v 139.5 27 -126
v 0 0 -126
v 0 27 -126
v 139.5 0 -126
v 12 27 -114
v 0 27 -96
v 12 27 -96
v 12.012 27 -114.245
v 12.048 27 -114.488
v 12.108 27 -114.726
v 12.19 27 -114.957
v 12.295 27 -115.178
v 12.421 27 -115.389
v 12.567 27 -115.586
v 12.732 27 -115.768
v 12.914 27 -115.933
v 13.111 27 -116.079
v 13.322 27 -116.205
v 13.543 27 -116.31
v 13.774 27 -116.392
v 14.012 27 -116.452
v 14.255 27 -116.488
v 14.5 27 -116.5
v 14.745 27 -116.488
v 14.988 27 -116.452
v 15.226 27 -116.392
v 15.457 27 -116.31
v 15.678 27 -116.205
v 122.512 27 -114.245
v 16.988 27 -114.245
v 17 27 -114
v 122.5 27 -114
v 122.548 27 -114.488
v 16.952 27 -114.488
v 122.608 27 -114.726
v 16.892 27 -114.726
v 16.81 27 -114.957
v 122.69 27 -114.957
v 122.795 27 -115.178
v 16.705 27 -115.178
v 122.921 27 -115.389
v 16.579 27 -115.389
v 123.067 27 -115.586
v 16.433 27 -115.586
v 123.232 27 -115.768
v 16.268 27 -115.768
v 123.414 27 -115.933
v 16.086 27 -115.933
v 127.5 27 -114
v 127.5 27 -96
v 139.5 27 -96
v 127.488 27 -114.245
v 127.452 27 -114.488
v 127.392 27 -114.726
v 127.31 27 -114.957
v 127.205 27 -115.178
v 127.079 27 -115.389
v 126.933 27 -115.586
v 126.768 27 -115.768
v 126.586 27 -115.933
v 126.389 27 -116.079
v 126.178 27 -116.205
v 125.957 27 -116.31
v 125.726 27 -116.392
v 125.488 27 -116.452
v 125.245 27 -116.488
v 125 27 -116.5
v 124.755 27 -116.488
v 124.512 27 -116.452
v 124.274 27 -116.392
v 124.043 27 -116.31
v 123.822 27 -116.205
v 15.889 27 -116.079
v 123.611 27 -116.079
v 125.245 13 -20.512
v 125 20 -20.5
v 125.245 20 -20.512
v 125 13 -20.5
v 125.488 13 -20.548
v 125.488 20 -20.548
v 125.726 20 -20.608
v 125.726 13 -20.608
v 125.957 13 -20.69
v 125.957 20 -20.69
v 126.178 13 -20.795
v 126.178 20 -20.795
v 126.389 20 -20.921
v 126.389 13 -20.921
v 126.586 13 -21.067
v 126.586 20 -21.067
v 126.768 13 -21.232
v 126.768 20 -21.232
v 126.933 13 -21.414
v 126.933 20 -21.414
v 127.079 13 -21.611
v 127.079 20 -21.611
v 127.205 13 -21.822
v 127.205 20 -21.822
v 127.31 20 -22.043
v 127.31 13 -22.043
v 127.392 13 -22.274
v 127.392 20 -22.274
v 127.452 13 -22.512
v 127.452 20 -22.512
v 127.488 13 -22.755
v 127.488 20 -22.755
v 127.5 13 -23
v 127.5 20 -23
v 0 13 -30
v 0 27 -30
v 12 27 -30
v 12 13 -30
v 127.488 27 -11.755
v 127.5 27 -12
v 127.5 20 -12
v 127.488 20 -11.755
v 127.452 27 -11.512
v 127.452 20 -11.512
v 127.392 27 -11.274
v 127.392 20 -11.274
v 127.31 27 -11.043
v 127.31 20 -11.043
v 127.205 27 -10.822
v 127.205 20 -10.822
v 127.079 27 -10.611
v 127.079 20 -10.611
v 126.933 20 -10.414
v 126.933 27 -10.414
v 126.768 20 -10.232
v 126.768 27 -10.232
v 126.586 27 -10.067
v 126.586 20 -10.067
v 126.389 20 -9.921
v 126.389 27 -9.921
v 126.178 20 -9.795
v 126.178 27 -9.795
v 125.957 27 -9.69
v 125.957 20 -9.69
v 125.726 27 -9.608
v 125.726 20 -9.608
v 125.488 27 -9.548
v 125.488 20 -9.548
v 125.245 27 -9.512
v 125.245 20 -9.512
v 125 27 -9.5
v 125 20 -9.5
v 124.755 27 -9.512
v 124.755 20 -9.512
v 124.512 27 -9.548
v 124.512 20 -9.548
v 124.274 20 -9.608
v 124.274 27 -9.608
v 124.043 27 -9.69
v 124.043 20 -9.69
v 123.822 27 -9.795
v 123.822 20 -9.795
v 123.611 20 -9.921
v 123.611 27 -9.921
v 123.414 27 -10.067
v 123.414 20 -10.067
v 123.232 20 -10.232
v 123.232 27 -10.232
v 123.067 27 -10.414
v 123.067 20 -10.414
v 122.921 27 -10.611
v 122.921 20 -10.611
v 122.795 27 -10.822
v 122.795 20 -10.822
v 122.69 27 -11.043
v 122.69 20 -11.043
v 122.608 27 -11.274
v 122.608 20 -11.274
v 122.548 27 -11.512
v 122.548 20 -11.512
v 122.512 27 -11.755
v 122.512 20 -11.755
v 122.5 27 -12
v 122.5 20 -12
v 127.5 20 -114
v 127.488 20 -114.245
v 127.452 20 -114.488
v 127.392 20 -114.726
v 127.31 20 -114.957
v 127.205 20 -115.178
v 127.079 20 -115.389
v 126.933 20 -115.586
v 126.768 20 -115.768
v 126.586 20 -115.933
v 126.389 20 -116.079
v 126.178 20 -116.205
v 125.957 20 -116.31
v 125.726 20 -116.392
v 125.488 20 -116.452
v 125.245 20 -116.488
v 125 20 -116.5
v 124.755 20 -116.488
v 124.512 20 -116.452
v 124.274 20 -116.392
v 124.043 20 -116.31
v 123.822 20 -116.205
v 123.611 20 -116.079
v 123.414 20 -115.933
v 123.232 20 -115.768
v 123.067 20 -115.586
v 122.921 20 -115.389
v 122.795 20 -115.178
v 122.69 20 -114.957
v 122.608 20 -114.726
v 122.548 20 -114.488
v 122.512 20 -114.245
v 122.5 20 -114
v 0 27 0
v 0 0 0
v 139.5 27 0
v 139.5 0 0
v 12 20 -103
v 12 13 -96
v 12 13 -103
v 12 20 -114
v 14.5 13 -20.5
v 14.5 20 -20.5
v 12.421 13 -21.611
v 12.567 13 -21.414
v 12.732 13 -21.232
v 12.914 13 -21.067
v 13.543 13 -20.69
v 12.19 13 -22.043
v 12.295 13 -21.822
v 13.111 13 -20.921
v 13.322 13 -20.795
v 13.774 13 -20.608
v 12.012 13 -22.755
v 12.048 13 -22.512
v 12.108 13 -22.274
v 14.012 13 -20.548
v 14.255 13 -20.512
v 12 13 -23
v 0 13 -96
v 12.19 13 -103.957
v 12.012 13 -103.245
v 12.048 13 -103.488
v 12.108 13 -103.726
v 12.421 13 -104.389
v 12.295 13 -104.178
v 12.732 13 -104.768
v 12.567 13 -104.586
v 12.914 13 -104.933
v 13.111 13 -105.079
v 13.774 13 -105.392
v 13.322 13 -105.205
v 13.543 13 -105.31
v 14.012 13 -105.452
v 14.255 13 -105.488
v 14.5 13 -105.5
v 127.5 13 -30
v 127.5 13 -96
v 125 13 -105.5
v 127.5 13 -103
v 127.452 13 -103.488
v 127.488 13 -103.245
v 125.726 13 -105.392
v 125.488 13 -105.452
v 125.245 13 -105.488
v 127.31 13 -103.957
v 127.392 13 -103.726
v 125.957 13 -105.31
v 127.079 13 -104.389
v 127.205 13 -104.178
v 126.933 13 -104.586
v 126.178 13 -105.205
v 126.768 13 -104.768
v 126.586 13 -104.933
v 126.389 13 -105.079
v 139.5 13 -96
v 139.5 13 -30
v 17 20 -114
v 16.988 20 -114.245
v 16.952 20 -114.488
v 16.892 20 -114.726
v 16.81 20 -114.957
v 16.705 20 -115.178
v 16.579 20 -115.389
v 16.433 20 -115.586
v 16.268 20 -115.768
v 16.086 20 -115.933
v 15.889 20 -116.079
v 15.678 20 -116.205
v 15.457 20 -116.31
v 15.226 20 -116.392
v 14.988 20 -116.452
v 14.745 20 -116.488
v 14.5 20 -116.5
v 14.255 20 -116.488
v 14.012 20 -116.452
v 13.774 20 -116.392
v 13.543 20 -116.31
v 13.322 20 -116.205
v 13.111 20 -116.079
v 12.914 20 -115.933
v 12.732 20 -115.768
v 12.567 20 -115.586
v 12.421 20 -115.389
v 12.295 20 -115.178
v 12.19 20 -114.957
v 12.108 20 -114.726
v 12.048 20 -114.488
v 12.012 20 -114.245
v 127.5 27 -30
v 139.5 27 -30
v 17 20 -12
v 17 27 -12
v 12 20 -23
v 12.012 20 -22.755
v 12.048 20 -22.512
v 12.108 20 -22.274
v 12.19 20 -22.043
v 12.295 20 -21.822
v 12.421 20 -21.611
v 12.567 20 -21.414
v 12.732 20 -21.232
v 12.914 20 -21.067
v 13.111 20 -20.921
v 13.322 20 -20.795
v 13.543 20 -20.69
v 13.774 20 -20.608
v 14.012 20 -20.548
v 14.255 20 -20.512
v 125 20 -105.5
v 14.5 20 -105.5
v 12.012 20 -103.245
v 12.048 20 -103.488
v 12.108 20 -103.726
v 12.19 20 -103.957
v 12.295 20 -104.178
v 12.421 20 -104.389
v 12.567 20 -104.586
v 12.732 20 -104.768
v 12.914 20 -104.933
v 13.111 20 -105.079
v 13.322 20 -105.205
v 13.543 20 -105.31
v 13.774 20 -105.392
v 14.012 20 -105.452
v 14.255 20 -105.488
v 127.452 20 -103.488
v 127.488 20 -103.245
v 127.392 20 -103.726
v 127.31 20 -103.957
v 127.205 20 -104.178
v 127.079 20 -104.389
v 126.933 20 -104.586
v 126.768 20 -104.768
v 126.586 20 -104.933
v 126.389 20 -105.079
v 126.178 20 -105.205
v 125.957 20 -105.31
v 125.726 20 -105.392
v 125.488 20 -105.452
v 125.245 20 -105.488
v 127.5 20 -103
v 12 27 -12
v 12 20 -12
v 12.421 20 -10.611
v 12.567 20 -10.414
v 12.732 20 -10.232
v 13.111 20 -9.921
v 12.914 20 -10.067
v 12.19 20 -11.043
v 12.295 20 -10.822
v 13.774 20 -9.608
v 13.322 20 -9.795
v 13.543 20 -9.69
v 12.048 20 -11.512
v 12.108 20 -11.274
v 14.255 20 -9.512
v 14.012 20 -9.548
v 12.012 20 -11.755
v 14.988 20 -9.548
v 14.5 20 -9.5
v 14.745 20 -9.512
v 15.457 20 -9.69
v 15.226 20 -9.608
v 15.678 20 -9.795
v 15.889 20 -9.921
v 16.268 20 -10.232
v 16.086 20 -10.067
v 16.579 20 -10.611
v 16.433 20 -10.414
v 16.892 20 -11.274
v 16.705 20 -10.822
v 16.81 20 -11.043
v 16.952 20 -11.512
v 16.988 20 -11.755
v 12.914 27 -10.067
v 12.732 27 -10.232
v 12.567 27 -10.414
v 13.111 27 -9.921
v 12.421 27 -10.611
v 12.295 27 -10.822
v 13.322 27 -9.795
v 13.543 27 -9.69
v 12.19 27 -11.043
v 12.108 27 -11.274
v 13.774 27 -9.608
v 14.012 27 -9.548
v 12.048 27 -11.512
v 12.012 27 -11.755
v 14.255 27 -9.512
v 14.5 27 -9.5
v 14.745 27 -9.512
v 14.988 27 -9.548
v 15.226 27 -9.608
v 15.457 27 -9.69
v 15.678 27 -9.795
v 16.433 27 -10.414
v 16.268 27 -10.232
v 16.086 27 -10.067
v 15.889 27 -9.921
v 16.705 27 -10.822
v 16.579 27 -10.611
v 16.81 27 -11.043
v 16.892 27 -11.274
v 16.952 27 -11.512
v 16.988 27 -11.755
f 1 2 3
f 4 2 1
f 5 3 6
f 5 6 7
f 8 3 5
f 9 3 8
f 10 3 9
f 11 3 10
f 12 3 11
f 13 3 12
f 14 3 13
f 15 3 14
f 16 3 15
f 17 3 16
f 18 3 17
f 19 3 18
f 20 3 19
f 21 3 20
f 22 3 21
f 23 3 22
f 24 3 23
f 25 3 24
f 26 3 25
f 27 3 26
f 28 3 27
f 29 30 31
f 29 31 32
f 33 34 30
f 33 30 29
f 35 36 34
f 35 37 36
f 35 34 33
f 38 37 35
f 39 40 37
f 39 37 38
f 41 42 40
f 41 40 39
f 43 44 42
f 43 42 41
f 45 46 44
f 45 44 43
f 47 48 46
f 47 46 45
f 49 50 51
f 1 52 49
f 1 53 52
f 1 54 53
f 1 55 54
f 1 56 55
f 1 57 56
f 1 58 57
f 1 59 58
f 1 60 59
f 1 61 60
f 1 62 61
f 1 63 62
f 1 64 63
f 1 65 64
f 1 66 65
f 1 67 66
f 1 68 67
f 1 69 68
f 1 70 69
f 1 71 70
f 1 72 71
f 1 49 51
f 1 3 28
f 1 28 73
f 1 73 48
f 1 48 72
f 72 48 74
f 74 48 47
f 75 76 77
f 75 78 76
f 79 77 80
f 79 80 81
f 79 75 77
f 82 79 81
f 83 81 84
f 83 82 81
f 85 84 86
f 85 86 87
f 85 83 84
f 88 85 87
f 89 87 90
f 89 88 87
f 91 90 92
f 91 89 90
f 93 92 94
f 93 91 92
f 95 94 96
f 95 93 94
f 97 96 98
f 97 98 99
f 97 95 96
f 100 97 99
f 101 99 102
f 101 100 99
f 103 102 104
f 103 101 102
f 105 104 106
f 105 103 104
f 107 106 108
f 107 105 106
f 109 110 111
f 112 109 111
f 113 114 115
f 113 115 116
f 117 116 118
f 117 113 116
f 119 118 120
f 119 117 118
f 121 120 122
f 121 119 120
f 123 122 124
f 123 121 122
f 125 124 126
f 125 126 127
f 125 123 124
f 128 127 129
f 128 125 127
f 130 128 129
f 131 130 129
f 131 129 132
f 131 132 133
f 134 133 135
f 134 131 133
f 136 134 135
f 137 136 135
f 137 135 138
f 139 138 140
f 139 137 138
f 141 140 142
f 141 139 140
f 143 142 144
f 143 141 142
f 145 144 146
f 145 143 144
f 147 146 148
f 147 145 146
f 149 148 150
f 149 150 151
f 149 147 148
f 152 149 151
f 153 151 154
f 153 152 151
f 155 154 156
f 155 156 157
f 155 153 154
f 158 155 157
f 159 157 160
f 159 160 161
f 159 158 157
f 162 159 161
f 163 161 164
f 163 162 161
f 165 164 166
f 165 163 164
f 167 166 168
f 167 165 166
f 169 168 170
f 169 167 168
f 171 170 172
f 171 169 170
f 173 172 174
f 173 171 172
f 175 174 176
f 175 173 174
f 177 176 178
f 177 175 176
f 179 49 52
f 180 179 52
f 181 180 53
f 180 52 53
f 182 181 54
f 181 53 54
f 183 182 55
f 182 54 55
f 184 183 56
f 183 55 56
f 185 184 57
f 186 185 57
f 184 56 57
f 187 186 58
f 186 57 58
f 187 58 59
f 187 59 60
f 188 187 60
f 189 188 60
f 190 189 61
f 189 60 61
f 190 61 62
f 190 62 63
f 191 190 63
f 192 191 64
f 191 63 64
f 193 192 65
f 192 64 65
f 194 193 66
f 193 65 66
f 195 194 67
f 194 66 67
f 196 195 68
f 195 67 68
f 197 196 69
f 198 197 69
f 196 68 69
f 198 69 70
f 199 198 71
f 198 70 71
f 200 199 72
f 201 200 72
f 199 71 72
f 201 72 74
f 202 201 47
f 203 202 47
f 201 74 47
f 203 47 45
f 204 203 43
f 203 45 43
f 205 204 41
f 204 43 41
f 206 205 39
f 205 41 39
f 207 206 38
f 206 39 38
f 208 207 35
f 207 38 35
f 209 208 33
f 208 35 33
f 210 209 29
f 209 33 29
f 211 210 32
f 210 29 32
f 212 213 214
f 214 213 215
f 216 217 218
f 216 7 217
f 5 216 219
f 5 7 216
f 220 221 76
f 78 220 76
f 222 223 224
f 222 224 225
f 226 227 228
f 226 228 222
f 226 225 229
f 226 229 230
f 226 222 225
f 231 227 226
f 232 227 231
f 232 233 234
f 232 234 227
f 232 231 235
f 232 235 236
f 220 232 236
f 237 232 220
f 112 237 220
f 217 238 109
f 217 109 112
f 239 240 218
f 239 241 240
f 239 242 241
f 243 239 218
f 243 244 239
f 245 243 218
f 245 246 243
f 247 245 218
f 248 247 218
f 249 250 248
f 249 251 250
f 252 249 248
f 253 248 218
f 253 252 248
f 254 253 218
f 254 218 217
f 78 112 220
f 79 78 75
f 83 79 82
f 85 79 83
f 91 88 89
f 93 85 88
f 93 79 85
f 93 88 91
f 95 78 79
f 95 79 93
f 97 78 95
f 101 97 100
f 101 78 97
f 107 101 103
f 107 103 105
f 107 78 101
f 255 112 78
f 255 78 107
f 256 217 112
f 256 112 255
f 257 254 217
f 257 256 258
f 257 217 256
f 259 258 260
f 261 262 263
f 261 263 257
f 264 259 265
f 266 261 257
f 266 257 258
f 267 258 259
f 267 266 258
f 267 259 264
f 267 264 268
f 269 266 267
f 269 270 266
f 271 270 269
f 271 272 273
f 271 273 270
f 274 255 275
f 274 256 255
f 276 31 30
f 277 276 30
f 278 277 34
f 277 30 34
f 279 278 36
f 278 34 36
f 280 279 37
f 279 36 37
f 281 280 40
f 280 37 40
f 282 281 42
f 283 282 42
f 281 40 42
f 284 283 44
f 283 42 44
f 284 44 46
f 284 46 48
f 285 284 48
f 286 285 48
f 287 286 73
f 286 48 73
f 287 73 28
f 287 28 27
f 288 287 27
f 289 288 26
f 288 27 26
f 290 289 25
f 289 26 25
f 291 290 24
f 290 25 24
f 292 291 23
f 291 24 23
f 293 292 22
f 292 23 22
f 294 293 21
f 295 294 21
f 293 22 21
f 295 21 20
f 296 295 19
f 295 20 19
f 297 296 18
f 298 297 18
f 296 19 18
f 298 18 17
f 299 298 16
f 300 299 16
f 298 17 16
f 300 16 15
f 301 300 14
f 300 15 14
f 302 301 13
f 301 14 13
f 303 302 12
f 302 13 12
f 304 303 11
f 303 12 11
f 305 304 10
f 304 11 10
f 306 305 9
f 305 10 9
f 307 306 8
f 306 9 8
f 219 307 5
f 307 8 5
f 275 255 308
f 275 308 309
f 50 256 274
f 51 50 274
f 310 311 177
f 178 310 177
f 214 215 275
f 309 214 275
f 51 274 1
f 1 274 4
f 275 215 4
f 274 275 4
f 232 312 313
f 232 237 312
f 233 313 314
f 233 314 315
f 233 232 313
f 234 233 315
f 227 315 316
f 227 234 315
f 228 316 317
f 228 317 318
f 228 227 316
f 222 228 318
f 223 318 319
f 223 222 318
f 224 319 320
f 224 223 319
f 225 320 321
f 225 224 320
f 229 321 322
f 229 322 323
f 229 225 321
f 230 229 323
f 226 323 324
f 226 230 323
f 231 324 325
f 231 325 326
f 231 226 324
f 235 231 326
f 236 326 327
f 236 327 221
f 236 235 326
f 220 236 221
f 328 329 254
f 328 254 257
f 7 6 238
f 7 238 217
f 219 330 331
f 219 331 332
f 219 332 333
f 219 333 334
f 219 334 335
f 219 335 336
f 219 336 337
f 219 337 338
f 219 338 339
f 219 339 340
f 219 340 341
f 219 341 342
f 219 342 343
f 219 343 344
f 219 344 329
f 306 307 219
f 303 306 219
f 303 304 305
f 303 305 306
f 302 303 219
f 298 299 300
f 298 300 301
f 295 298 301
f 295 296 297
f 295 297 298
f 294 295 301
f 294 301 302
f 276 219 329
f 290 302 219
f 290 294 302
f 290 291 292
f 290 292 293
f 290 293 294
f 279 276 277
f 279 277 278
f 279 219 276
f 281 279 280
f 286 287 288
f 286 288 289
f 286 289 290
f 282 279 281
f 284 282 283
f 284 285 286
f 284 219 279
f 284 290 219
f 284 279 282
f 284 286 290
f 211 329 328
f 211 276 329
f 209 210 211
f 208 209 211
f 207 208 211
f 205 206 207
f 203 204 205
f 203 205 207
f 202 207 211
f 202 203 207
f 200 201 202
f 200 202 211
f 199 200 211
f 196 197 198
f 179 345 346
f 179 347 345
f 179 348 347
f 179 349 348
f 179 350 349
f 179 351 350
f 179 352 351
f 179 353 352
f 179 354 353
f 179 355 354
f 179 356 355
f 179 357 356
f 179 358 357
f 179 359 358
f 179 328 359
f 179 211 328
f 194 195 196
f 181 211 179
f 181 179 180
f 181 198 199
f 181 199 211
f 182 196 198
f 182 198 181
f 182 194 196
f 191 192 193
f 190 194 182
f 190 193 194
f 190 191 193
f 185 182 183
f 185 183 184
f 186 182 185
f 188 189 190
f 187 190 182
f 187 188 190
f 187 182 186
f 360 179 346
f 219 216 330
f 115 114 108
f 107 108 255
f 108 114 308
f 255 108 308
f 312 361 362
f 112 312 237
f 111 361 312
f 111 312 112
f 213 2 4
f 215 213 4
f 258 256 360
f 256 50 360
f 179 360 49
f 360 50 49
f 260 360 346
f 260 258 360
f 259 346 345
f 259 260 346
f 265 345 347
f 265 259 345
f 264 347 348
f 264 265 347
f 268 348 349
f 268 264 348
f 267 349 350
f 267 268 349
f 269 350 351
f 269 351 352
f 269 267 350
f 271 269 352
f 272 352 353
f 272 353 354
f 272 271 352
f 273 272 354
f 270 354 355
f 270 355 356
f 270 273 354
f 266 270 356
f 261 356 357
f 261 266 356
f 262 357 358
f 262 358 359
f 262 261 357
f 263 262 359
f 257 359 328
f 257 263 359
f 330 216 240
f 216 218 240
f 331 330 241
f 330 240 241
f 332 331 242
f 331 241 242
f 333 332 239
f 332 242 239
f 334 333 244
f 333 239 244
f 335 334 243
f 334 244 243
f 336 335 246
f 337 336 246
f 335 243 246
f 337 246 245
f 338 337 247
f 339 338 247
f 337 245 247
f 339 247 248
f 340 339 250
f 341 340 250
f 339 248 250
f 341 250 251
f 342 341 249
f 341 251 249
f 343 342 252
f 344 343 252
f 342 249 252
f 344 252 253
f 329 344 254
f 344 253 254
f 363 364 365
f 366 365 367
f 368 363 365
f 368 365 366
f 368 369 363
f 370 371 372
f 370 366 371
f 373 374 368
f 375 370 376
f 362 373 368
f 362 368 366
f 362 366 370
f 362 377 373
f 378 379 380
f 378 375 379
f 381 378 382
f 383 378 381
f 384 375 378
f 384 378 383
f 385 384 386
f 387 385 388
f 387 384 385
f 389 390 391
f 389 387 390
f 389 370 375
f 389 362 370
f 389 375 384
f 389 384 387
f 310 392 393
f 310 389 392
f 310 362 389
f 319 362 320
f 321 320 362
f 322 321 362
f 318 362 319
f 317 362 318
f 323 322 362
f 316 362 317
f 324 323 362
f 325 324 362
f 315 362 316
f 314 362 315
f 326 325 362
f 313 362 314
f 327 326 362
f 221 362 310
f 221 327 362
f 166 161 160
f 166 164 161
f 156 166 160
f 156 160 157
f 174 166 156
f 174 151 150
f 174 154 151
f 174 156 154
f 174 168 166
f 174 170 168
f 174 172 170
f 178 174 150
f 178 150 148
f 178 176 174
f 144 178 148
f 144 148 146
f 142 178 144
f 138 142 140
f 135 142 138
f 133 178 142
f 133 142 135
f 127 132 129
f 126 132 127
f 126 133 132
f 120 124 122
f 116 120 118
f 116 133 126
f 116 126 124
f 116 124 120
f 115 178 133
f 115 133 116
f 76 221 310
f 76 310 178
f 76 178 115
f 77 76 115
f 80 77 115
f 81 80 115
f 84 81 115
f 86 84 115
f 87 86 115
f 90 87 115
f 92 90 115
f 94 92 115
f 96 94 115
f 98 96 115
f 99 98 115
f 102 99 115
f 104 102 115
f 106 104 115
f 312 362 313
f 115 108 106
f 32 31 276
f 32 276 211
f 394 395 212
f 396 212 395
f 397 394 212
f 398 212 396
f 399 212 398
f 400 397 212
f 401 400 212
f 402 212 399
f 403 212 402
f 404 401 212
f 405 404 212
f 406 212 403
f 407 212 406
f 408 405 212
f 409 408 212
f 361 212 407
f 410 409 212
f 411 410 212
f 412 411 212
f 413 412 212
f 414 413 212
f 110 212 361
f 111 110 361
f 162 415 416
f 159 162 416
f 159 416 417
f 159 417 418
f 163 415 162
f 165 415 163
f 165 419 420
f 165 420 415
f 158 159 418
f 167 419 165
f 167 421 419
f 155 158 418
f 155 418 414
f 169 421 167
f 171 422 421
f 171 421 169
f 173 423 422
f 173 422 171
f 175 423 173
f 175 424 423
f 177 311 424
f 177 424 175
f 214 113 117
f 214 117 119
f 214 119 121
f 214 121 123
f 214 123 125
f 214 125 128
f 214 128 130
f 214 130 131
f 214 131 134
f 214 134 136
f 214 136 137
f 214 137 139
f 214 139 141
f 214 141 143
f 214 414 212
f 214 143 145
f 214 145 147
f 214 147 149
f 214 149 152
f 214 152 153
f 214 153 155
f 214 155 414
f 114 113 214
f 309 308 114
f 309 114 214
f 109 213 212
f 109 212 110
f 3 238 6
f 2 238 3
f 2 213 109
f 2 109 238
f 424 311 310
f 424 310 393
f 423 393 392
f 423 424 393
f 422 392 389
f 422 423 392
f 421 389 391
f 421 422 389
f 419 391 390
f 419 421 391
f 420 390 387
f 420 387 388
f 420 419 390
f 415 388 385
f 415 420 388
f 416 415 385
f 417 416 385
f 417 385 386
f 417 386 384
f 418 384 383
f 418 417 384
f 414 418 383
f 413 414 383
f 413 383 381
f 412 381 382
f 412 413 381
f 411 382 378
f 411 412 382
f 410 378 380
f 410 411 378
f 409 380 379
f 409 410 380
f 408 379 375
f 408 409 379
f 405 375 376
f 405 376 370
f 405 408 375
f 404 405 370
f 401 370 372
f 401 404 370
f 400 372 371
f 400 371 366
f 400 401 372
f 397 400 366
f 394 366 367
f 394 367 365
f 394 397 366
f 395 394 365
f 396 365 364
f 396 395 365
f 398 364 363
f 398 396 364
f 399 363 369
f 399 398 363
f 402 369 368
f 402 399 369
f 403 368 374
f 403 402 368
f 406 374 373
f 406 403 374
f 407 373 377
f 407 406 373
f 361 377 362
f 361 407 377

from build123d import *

# Parameters (mm, degrees)
SKETCH1_W           = 139.5
SKETCH1_H           = 126
BOSS_EXTRUDE1_DEPTH = 27
SKETCH2_W           = 115.5
SKETCH2_H           = 102
CUT_EXTRUDE1_DEPTH  = 7
SKETCH3_W           = 115.5
SKETCH3_H           = 85
CUT_EXTRUDE2_DEPTH  = 7
SKETCH4_W           = 12
SKETCH4_H           = 66
CUT_EXTRUDE3_DEPTH  = 14
SKETCH5_W           = 12
SKETCH5_H           = 66
CUT_EXTRUDE4_DEPTH  = 14
CUT_EXTRUDE5_DEPTH  = 7
FILLET1_R           = 2.5


with BuildPart() as part:
    # Sketch1 → Boss-Extrude1 (new body)
    with BuildSketch(Plane(origin=(0, 0, 0), x_dir=(1, 0, 0), z_dir=(0, 1, 0))):
        with Locations((69.75, 63)):
            Rectangle(SKETCH1_W, SKETCH1_H)
    extrude(amount=BOSS_EXTRUDE1_DEPTH)

    # Sketch2 → Cut-Extrude1 (cut)
    with BuildSketch(Plane(origin=(0, 27, 0), x_dir=(1, 0, 0), z_dir=(0, 1, 0))):
        with Locations((69.75, 63)):
            Rectangle(SKETCH2_W, SKETCH2_H)
    extrude(amount=-CUT_EXTRUDE1_DEPTH, mode=Mode.SUBTRACT)

    # Sketch3 → Cut-Extrude2 (cut)
    with BuildSketch(Plane(origin=(0, 20, 0), x_dir=(1, 0, 0), z_dir=(0, 1, 0))):
        with Locations((69.75, 63)):
            Rectangle(SKETCH3_W, SKETCH3_H)
    extrude(amount=-CUT_EXTRUDE2_DEPTH, mode=Mode.SUBTRACT)

    # Sketch4 → Cut-Extrude3 (cut)
    with BuildSketch(Plane(origin=(0, 27, 0), x_dir=(1, 0, 0), z_dir=(0, 1, 0))):
        with Locations((6, 63)):
            Rectangle(SKETCH4_W, SKETCH4_H)
    extrude(amount=-CUT_EXTRUDE3_DEPTH, mode=Mode.SUBTRACT)

    # Sketch5 → Cut-Extrude4 (cut)
    with BuildSketch(Plane(origin=(0, 27, 0), x_dir=(1, 0, 0), z_dir=(0, 1, 0))):
        with Locations((133.5, 63)):
            Rectangle(SKETCH5_W, SKETCH5_H)
    extrude(amount=-CUT_EXTRUDE4_DEPTH, mode=Mode.SUBTRACT)

    # Sketch6 → Cut-Extrude5 (cut)
    with BuildSketch(Plane(origin=(0, 27, 0), x_dir=(1, 0, 0), z_dir=(0, 1, 0))):
        with BuildLine():
            Line((12, 12), (17, 12))
            ThreePointArc((17, 12), (14.5, 9.5), (12, 12))
        make_face()
        with BuildLine():
            Line((122.5, 12), (127.5, 12))
            ThreePointArc((127.5, 12), (125, 9.5), (122.5, 12))
        make_face()
        with BuildLine():
            Line((12, 114), (17, 114))
            ThreePointArc((17, 114), (14.5, 116.5), (12, 114))
        make_face()
        with BuildLine():
            Line((122.5, 114), (127.5, 114))
            ThreePointArc((127.5, 114), (125, 116.5), (122.5, 114))
        make_face()
    extrude(amount=-CUT_EXTRUDE5_DEPTH, mode=Mode.SUBTRACT)

    # Fillet1
    fillet1_edges = [part.edges().sort_by_distance(p)[0] for p in [
        (127.5, 16.5, -105.5),
        (127.5, 16.5, -20.5),
        (12, 16.5, -20.5),
        (12, 16.5, -105.5),
    ]]
    fillet(fillet1_edges, radius=FILLET1_R)


solid = part.part
